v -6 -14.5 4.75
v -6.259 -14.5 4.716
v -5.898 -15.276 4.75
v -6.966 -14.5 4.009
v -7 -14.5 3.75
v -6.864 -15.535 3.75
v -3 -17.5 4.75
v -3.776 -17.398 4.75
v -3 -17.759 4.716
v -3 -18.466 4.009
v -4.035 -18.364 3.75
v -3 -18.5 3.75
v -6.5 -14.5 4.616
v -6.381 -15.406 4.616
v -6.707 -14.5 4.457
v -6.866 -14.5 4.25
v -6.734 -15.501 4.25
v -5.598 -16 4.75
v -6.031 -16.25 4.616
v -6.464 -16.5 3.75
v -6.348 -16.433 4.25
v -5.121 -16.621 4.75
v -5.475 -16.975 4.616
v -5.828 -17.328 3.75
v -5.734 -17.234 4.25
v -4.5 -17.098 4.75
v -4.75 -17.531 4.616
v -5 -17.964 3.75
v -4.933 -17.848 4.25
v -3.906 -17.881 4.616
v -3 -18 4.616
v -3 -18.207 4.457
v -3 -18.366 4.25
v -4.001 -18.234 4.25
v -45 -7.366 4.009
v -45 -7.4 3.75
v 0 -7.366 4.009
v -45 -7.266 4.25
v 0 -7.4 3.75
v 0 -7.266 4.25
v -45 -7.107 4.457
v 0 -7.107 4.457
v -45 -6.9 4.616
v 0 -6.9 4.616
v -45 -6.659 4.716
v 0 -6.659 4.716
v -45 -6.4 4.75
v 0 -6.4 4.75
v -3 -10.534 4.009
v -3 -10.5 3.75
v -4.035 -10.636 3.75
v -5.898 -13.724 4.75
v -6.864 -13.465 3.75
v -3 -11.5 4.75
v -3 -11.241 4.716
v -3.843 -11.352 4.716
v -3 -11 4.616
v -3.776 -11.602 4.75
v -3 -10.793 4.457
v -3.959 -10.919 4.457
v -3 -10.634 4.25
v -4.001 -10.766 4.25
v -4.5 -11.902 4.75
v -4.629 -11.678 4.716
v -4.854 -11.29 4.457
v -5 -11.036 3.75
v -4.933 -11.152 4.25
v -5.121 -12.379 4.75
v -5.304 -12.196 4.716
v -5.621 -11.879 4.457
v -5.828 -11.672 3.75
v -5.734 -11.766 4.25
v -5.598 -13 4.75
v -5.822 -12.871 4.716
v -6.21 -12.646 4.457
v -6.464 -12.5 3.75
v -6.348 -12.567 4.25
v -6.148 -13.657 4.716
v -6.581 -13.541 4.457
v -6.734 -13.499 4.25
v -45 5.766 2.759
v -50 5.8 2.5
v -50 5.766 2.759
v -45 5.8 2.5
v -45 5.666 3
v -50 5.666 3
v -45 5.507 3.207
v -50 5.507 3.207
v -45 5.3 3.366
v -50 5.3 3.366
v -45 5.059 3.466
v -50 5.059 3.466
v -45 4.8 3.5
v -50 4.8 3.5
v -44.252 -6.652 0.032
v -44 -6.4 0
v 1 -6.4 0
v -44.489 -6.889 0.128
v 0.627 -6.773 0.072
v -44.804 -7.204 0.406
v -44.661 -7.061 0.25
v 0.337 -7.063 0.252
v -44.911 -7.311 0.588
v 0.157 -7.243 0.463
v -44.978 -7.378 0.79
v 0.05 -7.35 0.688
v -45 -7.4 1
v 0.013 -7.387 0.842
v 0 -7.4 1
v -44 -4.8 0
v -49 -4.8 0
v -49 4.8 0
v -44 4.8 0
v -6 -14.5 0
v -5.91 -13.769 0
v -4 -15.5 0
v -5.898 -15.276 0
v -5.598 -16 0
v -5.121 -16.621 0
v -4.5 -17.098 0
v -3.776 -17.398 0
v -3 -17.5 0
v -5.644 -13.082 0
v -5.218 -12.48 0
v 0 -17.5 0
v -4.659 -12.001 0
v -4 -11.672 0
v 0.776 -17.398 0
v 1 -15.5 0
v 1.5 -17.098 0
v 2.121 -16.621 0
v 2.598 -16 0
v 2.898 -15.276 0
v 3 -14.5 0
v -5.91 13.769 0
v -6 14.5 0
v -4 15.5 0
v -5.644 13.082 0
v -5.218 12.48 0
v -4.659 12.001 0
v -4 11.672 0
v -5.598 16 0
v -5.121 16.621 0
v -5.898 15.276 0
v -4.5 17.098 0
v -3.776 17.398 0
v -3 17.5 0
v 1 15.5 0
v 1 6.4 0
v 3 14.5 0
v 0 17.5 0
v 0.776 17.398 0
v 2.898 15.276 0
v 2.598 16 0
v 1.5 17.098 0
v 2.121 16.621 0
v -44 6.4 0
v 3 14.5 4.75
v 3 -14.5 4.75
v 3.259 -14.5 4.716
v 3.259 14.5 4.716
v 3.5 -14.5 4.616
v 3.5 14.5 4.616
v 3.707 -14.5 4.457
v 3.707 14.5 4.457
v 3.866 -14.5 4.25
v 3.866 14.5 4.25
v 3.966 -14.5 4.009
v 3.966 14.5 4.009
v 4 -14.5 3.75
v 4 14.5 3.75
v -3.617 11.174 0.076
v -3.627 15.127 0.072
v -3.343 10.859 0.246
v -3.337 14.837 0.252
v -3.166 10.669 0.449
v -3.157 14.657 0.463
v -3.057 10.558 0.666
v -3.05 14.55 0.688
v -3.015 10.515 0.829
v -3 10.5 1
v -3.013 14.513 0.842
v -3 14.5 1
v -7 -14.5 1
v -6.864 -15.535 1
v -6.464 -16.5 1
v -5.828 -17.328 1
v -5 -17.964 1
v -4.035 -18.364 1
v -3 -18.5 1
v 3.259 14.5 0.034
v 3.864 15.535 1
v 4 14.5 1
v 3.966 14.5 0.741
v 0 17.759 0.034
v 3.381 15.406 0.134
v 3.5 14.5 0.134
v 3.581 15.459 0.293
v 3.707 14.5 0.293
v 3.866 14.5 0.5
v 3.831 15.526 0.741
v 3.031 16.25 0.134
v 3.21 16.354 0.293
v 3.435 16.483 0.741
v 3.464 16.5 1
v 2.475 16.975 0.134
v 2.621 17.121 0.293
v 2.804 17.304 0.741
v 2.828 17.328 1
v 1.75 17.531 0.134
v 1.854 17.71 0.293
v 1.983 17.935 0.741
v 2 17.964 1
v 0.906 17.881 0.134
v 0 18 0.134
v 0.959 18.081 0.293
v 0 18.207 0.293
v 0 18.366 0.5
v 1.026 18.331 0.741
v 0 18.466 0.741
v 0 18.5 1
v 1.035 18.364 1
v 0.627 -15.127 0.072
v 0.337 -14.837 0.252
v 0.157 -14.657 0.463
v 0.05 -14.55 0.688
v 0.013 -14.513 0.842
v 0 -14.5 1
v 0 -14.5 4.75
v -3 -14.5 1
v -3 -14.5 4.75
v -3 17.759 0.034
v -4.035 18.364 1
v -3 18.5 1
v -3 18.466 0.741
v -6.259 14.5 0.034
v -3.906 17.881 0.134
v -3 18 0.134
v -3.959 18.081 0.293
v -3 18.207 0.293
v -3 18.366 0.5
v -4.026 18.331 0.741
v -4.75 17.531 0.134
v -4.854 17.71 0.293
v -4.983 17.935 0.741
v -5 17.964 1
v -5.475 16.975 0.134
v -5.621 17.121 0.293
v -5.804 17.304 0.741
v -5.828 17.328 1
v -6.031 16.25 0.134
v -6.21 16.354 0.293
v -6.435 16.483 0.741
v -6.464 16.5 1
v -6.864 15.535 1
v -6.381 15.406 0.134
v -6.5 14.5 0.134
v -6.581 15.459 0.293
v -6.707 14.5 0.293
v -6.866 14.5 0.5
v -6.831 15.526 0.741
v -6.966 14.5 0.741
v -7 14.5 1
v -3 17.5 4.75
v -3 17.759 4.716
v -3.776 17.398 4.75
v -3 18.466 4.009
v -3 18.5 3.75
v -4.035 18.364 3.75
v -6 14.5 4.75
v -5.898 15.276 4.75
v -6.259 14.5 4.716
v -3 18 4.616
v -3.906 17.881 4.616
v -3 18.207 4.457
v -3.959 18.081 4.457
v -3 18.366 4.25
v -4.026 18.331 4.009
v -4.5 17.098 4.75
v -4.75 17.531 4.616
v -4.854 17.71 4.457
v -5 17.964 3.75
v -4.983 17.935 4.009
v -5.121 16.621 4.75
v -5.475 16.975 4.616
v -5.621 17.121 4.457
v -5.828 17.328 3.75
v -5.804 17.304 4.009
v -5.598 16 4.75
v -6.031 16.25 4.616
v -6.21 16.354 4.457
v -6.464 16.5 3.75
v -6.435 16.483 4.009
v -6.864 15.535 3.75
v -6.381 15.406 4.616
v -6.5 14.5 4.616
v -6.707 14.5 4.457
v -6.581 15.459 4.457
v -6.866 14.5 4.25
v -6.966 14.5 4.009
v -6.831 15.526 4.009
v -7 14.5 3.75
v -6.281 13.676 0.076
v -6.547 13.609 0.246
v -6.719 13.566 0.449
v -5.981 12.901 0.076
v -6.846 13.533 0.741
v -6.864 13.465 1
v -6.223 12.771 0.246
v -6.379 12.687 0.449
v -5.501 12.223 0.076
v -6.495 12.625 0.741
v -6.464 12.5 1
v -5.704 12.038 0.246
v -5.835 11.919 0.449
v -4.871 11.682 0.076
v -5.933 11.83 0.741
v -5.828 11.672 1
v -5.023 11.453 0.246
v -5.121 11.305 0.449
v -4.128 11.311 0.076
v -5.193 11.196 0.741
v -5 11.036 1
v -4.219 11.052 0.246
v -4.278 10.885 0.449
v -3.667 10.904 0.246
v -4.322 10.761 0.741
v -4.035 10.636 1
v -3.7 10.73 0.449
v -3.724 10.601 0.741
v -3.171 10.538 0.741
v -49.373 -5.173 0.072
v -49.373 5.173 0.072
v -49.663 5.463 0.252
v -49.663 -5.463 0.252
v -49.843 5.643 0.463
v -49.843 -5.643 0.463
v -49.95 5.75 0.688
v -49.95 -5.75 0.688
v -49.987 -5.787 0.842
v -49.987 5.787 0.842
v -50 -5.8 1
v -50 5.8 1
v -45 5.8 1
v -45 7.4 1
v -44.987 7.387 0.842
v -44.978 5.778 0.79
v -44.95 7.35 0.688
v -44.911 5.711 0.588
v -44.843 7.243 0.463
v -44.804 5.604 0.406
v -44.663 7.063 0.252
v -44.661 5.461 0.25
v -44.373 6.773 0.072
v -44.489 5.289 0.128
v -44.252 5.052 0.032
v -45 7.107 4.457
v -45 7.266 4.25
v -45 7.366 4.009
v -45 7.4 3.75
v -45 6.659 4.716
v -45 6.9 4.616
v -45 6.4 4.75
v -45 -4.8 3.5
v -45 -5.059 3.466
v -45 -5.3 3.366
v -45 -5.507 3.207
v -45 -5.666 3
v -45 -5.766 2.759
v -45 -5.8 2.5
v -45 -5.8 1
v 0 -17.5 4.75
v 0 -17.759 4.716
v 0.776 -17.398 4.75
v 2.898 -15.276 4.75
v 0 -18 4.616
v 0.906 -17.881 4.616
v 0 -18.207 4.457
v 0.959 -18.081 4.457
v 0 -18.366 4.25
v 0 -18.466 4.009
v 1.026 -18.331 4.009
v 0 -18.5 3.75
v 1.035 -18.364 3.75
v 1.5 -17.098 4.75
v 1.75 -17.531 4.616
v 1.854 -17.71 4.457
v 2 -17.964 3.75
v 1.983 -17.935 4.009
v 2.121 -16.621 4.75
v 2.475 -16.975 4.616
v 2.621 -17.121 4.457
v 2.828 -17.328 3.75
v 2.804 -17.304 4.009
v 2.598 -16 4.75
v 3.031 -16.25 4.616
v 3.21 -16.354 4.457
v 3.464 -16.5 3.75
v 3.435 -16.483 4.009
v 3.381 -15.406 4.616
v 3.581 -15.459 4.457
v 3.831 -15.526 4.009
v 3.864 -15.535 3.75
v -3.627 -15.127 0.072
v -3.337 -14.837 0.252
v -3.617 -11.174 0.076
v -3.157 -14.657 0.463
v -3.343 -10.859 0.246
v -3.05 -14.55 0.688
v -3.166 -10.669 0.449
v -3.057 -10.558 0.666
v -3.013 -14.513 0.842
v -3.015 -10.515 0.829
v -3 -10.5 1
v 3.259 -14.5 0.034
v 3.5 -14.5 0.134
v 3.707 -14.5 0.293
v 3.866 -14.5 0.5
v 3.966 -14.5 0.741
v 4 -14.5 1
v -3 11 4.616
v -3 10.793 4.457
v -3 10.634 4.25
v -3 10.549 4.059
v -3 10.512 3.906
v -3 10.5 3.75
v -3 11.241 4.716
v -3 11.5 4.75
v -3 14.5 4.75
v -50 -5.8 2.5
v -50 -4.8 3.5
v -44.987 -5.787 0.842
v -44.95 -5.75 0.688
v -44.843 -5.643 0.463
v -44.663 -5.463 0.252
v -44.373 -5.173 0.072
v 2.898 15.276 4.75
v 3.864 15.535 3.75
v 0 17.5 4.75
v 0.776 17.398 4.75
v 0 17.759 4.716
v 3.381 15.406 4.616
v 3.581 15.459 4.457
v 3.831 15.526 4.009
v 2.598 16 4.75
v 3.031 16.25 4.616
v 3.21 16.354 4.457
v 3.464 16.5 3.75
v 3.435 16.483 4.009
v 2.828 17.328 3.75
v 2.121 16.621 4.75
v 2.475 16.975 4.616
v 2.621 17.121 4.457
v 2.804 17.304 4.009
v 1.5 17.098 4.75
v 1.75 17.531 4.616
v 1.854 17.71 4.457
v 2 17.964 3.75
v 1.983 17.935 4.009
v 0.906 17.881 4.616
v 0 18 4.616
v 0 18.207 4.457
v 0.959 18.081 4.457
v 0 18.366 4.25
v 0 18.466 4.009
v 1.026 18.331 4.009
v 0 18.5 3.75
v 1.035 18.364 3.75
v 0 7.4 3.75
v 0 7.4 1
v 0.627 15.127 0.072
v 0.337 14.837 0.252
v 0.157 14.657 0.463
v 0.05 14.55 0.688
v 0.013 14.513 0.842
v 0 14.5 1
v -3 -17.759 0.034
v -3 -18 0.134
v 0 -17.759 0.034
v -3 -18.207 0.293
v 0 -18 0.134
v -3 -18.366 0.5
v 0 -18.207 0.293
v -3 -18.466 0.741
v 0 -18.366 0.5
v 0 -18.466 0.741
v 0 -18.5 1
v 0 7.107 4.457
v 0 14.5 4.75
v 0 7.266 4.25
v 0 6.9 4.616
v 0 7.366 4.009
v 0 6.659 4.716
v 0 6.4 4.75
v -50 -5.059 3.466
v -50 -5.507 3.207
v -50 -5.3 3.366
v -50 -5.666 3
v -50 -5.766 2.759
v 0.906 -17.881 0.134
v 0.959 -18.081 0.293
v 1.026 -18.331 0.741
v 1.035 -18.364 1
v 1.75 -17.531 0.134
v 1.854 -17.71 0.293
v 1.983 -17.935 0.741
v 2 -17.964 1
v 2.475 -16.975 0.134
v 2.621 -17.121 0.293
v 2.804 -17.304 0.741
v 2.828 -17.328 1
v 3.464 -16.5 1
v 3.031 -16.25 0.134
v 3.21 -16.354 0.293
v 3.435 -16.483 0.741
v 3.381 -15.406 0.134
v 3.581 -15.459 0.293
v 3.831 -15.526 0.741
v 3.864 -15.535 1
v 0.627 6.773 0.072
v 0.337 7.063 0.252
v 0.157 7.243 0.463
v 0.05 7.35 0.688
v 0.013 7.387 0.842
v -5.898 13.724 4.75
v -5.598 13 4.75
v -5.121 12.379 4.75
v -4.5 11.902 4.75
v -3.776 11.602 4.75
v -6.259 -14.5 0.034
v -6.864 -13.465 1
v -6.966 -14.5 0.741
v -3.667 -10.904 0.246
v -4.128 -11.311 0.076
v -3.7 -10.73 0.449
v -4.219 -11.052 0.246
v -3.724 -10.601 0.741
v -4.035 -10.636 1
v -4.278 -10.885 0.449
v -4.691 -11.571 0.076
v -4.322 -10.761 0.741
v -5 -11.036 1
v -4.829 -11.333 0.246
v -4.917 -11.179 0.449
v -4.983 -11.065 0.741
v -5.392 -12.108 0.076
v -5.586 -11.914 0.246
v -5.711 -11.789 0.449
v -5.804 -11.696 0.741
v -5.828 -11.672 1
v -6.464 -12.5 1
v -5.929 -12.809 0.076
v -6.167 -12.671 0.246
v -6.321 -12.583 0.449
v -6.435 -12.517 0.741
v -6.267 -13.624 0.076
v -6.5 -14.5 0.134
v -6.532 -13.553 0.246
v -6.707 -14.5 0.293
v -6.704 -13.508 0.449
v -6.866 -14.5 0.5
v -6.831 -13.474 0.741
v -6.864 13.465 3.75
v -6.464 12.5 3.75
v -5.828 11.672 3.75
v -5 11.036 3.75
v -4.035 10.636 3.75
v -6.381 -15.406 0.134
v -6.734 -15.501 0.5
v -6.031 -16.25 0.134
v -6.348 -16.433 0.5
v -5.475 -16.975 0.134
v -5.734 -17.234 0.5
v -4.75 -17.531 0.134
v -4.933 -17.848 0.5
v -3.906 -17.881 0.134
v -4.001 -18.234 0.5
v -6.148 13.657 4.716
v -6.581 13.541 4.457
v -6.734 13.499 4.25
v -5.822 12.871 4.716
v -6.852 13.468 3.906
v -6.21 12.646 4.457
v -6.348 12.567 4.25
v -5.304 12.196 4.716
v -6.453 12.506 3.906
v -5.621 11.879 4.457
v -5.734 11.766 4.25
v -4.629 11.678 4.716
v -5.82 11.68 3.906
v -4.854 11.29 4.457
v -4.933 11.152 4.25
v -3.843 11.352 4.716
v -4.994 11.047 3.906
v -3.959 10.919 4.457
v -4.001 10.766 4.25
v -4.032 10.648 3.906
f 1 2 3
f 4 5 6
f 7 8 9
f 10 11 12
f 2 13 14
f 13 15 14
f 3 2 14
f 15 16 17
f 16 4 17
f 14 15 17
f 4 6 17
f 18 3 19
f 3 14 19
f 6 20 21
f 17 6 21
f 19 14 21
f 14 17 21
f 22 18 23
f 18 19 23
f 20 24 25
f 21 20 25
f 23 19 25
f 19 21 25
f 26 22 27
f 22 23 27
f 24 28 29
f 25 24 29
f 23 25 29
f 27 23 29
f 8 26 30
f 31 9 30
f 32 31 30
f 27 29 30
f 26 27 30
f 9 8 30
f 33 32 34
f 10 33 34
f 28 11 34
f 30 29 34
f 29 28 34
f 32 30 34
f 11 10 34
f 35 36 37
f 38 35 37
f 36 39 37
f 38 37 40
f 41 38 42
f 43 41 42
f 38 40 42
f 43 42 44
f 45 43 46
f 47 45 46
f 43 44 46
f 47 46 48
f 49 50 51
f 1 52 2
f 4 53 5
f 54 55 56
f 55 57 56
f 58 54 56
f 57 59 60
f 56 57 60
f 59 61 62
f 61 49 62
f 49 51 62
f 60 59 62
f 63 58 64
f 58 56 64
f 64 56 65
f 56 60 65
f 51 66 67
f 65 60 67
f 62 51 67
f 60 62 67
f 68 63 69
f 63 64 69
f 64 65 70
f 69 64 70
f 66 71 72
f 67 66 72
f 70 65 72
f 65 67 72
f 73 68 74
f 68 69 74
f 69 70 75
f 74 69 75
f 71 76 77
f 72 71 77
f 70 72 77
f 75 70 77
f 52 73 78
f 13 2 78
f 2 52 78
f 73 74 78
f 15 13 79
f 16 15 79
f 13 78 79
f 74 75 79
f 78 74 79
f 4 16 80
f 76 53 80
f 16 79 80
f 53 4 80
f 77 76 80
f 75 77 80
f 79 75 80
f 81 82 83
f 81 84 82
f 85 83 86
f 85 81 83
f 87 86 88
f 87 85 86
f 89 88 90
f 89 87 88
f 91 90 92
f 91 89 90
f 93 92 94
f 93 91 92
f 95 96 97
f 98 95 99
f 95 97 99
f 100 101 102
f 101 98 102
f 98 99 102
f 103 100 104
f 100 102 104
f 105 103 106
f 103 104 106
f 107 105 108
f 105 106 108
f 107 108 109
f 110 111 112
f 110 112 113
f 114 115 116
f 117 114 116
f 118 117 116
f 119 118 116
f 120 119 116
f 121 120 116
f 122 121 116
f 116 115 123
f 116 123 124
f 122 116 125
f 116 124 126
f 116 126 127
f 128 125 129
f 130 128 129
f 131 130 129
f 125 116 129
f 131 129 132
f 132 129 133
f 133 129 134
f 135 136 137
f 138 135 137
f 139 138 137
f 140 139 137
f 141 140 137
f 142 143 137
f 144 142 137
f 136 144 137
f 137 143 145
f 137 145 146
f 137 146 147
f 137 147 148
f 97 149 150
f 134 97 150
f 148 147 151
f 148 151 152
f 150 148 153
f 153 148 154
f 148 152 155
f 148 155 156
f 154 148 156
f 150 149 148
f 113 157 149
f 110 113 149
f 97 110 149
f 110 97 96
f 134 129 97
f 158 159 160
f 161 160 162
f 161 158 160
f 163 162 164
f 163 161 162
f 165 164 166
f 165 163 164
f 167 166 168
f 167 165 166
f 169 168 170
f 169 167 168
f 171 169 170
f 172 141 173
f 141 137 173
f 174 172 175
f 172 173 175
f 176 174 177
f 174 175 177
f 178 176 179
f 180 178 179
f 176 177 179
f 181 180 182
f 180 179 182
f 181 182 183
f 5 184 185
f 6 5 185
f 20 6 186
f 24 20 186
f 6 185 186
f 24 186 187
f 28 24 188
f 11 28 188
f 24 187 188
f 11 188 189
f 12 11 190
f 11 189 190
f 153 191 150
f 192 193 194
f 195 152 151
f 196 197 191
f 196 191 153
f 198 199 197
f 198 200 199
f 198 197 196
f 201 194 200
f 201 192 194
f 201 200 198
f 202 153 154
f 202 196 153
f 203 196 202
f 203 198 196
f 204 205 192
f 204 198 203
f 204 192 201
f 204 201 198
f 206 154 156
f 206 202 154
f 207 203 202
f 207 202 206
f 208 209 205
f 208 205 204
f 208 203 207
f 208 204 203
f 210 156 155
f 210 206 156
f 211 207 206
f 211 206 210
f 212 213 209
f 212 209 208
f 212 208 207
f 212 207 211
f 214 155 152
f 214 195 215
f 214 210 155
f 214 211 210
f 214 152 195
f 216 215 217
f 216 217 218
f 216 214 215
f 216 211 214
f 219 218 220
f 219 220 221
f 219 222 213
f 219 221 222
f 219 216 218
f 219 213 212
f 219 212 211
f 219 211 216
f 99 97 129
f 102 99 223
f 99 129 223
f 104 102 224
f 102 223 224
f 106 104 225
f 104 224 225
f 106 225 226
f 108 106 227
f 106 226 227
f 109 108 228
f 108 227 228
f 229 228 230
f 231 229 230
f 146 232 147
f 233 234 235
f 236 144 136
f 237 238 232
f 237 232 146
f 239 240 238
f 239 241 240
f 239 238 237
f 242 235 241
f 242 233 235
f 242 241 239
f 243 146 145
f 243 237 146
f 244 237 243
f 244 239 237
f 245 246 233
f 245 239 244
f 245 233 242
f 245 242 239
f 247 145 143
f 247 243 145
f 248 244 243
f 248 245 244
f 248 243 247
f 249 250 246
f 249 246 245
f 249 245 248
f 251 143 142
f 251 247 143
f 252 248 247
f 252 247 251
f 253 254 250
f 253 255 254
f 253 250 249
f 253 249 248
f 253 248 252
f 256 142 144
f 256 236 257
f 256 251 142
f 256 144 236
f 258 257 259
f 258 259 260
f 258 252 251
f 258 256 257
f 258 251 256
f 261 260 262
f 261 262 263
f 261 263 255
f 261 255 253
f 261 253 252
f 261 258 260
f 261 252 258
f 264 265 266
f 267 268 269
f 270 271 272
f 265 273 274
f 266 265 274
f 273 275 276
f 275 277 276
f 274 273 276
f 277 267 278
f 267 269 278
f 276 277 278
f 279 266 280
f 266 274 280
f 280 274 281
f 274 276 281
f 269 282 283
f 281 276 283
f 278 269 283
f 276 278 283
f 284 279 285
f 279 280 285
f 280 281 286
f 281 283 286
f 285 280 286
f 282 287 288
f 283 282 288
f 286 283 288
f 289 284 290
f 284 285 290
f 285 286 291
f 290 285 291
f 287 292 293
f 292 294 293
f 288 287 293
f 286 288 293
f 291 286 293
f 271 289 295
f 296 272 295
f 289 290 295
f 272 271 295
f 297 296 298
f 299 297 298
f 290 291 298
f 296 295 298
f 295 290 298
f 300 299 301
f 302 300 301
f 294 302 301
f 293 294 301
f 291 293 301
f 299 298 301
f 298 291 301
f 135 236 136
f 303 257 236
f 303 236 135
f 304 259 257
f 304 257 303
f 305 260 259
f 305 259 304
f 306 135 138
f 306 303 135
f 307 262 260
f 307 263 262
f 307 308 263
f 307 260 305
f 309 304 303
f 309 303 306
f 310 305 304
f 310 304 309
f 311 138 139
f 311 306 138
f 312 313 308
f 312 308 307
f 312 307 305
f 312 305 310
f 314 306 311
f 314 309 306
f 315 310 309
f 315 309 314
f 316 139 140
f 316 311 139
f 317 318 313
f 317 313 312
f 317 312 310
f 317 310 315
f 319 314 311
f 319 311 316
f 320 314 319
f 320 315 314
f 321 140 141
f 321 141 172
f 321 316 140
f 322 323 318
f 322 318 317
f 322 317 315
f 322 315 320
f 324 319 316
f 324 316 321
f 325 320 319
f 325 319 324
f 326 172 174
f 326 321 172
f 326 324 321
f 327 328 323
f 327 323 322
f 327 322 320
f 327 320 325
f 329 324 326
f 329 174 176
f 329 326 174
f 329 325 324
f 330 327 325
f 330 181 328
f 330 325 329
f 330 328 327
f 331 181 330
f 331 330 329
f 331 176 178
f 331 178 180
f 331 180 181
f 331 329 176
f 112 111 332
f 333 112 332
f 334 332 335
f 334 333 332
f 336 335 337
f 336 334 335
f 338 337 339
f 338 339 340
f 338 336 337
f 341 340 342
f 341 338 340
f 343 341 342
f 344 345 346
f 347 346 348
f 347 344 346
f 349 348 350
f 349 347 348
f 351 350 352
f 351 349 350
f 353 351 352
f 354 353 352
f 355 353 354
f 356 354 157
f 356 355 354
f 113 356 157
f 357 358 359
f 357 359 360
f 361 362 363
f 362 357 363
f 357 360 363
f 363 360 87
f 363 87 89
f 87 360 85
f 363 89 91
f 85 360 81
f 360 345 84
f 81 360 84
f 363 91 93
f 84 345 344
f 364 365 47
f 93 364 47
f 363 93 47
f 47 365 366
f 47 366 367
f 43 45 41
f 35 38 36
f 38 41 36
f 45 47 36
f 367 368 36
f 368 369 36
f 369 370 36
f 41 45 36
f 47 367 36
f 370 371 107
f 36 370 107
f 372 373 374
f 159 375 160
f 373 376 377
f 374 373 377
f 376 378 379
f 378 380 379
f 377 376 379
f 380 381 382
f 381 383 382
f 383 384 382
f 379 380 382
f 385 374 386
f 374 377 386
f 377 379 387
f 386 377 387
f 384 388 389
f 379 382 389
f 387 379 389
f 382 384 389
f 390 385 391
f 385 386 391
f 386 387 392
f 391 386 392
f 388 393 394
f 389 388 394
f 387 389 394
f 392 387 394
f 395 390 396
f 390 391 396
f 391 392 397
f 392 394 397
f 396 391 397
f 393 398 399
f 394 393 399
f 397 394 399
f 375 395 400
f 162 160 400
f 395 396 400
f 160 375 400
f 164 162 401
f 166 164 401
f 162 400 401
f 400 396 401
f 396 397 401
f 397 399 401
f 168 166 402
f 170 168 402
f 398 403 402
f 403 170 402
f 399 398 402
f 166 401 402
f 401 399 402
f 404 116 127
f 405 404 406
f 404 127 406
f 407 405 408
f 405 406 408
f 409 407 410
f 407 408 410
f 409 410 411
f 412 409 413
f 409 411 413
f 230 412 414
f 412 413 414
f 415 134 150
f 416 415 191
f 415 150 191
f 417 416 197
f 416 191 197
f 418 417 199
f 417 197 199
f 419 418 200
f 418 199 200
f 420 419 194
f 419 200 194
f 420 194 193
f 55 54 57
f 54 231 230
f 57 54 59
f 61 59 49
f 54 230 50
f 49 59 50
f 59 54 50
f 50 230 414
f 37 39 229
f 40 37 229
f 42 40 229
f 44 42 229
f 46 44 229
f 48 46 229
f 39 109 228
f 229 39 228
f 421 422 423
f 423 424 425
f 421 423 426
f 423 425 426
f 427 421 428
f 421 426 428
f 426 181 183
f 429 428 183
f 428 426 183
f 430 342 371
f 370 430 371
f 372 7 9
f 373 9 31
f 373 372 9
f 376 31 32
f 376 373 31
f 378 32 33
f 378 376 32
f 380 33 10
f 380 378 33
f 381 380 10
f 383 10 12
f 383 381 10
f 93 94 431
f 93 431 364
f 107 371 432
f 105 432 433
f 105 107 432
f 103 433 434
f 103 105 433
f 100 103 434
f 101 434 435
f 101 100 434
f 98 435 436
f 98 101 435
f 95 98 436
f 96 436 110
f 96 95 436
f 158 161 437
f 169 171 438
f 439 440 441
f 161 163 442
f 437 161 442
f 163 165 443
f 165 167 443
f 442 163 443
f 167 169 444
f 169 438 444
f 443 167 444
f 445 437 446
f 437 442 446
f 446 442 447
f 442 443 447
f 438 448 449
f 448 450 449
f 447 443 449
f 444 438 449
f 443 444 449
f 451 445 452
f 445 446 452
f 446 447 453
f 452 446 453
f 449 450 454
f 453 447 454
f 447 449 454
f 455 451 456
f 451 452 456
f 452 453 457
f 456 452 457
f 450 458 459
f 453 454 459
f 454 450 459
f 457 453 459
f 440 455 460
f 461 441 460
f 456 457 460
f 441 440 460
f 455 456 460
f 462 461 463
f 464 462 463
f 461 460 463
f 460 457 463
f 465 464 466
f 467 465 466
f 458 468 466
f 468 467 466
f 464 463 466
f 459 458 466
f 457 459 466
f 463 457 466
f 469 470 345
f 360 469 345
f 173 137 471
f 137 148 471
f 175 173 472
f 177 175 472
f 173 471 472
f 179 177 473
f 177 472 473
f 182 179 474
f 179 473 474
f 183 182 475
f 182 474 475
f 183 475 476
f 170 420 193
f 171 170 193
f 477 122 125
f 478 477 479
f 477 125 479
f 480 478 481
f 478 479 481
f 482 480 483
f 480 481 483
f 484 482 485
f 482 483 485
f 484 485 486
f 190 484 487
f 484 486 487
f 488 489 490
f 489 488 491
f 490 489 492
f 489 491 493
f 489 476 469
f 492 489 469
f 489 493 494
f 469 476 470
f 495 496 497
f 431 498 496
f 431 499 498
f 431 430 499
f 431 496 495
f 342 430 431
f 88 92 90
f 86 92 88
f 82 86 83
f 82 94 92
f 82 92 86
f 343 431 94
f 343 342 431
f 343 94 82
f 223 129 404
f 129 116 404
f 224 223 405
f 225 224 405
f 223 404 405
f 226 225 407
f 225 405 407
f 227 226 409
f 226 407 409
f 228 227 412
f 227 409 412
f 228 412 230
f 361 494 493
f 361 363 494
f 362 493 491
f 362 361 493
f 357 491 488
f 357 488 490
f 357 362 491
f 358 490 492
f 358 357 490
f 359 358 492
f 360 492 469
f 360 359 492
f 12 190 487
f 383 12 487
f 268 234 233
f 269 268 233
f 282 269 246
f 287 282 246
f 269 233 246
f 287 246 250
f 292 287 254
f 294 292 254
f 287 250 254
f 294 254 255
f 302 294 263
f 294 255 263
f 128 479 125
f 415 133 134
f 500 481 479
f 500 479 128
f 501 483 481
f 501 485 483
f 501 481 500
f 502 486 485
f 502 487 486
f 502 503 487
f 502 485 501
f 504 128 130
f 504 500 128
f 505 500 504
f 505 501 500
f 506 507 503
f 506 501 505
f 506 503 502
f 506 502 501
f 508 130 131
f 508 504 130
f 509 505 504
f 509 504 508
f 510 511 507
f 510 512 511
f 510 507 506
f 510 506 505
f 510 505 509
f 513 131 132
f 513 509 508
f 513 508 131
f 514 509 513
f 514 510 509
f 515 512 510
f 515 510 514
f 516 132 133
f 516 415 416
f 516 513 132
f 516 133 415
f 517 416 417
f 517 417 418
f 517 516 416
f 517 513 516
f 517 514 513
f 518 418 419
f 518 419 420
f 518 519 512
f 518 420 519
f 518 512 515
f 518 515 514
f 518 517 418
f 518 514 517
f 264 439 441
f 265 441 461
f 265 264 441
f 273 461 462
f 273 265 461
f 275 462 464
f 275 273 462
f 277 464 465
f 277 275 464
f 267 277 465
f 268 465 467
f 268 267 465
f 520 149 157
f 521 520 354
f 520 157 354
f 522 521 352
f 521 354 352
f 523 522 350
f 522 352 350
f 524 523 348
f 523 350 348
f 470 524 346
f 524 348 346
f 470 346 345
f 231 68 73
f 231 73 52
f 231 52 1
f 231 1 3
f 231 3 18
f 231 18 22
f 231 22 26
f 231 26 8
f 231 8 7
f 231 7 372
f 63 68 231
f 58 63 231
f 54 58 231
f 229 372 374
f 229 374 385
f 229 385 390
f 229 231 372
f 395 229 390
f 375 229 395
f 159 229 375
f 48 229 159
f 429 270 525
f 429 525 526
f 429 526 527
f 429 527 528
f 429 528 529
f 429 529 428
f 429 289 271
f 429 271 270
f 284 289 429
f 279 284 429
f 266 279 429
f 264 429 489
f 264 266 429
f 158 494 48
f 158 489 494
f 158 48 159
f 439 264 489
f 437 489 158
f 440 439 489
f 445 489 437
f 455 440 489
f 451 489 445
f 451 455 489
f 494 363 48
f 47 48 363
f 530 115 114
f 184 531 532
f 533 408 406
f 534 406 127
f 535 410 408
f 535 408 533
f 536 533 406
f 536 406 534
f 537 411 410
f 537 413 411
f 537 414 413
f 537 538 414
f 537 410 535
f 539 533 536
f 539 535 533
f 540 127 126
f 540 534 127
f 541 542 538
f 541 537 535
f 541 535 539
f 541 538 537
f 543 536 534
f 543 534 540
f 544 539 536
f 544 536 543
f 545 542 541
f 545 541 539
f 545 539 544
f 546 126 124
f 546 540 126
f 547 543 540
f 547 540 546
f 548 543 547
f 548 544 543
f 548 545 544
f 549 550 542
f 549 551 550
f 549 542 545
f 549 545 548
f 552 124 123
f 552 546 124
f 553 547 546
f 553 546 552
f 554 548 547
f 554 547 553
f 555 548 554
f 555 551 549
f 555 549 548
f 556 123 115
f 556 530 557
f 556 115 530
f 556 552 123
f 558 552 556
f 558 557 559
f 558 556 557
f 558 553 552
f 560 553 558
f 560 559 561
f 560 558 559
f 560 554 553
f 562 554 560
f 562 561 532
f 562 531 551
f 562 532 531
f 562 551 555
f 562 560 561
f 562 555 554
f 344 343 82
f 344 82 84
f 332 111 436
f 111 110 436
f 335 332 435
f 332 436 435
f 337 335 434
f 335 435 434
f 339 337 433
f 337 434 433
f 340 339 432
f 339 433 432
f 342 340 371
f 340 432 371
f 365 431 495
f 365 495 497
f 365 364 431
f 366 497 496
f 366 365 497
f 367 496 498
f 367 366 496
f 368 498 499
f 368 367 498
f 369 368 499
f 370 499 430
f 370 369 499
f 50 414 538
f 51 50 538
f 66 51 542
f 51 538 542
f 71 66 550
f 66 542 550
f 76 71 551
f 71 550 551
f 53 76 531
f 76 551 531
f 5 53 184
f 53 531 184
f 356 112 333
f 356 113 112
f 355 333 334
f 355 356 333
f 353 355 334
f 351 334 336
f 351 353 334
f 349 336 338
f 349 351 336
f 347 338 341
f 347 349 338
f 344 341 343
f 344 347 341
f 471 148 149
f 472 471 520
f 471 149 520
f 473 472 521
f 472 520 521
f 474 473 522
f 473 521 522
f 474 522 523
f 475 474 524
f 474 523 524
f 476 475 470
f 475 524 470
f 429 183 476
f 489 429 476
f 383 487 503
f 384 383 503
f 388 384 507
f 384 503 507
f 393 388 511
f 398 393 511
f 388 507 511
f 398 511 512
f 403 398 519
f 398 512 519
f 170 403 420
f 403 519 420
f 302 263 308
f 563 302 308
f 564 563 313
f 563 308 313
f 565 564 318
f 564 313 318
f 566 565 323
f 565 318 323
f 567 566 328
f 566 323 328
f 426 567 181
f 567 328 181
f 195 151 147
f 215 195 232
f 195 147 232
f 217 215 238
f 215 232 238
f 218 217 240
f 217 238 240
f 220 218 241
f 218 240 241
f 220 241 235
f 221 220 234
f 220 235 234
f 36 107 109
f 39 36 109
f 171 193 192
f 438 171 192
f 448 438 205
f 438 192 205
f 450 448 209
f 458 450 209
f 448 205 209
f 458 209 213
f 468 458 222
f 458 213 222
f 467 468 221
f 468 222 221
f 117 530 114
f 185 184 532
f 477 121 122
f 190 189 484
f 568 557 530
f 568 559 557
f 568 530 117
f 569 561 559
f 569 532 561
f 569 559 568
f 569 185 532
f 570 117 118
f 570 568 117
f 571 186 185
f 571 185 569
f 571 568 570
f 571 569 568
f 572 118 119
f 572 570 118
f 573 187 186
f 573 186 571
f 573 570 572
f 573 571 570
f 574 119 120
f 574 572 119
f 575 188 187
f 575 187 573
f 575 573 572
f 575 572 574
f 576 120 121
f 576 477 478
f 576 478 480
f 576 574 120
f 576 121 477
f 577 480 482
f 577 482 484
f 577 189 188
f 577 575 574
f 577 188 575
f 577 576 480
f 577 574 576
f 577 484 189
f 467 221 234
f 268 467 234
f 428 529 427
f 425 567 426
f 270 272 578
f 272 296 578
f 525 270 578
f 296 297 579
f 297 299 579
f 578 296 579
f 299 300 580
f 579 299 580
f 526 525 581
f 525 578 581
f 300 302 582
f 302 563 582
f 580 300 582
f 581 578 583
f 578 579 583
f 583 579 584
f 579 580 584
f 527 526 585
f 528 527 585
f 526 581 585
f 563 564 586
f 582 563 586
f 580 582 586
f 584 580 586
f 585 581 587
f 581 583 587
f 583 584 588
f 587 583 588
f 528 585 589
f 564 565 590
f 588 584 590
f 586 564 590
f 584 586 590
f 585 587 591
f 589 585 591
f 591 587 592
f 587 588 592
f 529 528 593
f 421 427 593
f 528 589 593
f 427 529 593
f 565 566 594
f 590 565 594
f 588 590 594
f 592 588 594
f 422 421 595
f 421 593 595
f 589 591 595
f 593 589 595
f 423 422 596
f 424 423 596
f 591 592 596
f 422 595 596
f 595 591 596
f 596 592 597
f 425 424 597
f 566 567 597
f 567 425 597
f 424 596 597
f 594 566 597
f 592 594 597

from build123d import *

# Parameters (mm, degrees)
F1_DEPTH = 4.75
F0_W     = 5
F0_H     = 11.6
F2_DEPTH = 3.5
F3_R     = 1


with BuildPart() as f1:
    # F0 (on Top) → F1 (new body)
    with BuildSketch(Plane.XY):
        with BuildLine():
            Line((-45, 7.4), (-45, 5.8))
            Line((-45, 5.8), (-45, -5.8))
            Line((-45, -5.8), (-45, -7.4))
            Line((-45, -7.4), (0, -7.4))
            Line((0, -7.4), (0, -14.5))
            Line((0, -14.5), (-3, -14.5))
            Line((-3, -14.5), (-3, -10.5))
            ThreePointArc((-3, -10.5), (-5.828427, -11.671573), (-7, -14.5))
            ThreePointArc((-7, -14.5), (-5.828427, -17.328427), (-3, -18.5))
            Line((-3, -18.5), (0, -18.5))
            ThreePointArc((0, -18.5), (2.828427, -17.328427), (4, -14.5))
            Line((4, -14.5), (4, 0))
            Line((4, 0), (4, 14.5))
            ThreePointArc((4, 14.5), (2.828427, 17.328427), (0, 18.5))
            Line((0, 18.5), (-3, 18.5))
            ThreePointArc((-3, 18.5), (-5.828427, 17.328427), (-7, 14.5))
            ThreePointArc((-7, 14.5), (-5.828427, 11.671573), (-3, 10.5))
            Line((-3, 10.5), (-3, 14.5))
            Line((-3, 14.5), (0, 14.5))
            Line((0, 14.5), (0, 7.4))
            Line((0, 7.4), (-45, 7.4))
        make_face()
    extrude(amount=F1_DEPTH)

    # F0 (on Top) → F2 (join)
    with BuildSketch(Plane.XY):
        with Locations((-47.5, 0)):
            Rectangle(F0_W, F0_H)
    extrude(amount=F2_DEPTH)

    # F3
    f3_edges = [f1.edges().sort_by_distance(p)[0] for p in [
        (-47.5, -5.8, 3.5),
        (-47.5, 5.8, 3.5),
        (-22.5, -7.4, 4.75),
        (-22.5, 7.4, 4.75),
        (-7, 14.5, 4.75),
        (2.828427, 17.328427, 0),
        (-1.5, 18.5, 0),
        (-7, 14.5, 0),
        (-3, 12.5, 0),
        (-1.5, 14.5, 0),
        (0, 10.95, 0),
        (-22.5, 7.4, 0),
        (-45, 6.6, 0),
        (-47.5, 5.8, 0),
        (-50, 0, 0),
        (-47.5, -5.8, 0),
        (-45, -6.6, 0),
        (-22.5, -7.4, 0),
        (0, -10.95, 0),
        (-1.5, -14.5, 0),
        (-3, -12.5, 0),
        (-7, -14.5, 0),
        (-1.5, -18.5, 0),
        (2.828427, -17.328427, 0),
        (4, 0, 0),
    ]]
    fillet(f3_edges, radius=F3_R)


solid = f1.part
